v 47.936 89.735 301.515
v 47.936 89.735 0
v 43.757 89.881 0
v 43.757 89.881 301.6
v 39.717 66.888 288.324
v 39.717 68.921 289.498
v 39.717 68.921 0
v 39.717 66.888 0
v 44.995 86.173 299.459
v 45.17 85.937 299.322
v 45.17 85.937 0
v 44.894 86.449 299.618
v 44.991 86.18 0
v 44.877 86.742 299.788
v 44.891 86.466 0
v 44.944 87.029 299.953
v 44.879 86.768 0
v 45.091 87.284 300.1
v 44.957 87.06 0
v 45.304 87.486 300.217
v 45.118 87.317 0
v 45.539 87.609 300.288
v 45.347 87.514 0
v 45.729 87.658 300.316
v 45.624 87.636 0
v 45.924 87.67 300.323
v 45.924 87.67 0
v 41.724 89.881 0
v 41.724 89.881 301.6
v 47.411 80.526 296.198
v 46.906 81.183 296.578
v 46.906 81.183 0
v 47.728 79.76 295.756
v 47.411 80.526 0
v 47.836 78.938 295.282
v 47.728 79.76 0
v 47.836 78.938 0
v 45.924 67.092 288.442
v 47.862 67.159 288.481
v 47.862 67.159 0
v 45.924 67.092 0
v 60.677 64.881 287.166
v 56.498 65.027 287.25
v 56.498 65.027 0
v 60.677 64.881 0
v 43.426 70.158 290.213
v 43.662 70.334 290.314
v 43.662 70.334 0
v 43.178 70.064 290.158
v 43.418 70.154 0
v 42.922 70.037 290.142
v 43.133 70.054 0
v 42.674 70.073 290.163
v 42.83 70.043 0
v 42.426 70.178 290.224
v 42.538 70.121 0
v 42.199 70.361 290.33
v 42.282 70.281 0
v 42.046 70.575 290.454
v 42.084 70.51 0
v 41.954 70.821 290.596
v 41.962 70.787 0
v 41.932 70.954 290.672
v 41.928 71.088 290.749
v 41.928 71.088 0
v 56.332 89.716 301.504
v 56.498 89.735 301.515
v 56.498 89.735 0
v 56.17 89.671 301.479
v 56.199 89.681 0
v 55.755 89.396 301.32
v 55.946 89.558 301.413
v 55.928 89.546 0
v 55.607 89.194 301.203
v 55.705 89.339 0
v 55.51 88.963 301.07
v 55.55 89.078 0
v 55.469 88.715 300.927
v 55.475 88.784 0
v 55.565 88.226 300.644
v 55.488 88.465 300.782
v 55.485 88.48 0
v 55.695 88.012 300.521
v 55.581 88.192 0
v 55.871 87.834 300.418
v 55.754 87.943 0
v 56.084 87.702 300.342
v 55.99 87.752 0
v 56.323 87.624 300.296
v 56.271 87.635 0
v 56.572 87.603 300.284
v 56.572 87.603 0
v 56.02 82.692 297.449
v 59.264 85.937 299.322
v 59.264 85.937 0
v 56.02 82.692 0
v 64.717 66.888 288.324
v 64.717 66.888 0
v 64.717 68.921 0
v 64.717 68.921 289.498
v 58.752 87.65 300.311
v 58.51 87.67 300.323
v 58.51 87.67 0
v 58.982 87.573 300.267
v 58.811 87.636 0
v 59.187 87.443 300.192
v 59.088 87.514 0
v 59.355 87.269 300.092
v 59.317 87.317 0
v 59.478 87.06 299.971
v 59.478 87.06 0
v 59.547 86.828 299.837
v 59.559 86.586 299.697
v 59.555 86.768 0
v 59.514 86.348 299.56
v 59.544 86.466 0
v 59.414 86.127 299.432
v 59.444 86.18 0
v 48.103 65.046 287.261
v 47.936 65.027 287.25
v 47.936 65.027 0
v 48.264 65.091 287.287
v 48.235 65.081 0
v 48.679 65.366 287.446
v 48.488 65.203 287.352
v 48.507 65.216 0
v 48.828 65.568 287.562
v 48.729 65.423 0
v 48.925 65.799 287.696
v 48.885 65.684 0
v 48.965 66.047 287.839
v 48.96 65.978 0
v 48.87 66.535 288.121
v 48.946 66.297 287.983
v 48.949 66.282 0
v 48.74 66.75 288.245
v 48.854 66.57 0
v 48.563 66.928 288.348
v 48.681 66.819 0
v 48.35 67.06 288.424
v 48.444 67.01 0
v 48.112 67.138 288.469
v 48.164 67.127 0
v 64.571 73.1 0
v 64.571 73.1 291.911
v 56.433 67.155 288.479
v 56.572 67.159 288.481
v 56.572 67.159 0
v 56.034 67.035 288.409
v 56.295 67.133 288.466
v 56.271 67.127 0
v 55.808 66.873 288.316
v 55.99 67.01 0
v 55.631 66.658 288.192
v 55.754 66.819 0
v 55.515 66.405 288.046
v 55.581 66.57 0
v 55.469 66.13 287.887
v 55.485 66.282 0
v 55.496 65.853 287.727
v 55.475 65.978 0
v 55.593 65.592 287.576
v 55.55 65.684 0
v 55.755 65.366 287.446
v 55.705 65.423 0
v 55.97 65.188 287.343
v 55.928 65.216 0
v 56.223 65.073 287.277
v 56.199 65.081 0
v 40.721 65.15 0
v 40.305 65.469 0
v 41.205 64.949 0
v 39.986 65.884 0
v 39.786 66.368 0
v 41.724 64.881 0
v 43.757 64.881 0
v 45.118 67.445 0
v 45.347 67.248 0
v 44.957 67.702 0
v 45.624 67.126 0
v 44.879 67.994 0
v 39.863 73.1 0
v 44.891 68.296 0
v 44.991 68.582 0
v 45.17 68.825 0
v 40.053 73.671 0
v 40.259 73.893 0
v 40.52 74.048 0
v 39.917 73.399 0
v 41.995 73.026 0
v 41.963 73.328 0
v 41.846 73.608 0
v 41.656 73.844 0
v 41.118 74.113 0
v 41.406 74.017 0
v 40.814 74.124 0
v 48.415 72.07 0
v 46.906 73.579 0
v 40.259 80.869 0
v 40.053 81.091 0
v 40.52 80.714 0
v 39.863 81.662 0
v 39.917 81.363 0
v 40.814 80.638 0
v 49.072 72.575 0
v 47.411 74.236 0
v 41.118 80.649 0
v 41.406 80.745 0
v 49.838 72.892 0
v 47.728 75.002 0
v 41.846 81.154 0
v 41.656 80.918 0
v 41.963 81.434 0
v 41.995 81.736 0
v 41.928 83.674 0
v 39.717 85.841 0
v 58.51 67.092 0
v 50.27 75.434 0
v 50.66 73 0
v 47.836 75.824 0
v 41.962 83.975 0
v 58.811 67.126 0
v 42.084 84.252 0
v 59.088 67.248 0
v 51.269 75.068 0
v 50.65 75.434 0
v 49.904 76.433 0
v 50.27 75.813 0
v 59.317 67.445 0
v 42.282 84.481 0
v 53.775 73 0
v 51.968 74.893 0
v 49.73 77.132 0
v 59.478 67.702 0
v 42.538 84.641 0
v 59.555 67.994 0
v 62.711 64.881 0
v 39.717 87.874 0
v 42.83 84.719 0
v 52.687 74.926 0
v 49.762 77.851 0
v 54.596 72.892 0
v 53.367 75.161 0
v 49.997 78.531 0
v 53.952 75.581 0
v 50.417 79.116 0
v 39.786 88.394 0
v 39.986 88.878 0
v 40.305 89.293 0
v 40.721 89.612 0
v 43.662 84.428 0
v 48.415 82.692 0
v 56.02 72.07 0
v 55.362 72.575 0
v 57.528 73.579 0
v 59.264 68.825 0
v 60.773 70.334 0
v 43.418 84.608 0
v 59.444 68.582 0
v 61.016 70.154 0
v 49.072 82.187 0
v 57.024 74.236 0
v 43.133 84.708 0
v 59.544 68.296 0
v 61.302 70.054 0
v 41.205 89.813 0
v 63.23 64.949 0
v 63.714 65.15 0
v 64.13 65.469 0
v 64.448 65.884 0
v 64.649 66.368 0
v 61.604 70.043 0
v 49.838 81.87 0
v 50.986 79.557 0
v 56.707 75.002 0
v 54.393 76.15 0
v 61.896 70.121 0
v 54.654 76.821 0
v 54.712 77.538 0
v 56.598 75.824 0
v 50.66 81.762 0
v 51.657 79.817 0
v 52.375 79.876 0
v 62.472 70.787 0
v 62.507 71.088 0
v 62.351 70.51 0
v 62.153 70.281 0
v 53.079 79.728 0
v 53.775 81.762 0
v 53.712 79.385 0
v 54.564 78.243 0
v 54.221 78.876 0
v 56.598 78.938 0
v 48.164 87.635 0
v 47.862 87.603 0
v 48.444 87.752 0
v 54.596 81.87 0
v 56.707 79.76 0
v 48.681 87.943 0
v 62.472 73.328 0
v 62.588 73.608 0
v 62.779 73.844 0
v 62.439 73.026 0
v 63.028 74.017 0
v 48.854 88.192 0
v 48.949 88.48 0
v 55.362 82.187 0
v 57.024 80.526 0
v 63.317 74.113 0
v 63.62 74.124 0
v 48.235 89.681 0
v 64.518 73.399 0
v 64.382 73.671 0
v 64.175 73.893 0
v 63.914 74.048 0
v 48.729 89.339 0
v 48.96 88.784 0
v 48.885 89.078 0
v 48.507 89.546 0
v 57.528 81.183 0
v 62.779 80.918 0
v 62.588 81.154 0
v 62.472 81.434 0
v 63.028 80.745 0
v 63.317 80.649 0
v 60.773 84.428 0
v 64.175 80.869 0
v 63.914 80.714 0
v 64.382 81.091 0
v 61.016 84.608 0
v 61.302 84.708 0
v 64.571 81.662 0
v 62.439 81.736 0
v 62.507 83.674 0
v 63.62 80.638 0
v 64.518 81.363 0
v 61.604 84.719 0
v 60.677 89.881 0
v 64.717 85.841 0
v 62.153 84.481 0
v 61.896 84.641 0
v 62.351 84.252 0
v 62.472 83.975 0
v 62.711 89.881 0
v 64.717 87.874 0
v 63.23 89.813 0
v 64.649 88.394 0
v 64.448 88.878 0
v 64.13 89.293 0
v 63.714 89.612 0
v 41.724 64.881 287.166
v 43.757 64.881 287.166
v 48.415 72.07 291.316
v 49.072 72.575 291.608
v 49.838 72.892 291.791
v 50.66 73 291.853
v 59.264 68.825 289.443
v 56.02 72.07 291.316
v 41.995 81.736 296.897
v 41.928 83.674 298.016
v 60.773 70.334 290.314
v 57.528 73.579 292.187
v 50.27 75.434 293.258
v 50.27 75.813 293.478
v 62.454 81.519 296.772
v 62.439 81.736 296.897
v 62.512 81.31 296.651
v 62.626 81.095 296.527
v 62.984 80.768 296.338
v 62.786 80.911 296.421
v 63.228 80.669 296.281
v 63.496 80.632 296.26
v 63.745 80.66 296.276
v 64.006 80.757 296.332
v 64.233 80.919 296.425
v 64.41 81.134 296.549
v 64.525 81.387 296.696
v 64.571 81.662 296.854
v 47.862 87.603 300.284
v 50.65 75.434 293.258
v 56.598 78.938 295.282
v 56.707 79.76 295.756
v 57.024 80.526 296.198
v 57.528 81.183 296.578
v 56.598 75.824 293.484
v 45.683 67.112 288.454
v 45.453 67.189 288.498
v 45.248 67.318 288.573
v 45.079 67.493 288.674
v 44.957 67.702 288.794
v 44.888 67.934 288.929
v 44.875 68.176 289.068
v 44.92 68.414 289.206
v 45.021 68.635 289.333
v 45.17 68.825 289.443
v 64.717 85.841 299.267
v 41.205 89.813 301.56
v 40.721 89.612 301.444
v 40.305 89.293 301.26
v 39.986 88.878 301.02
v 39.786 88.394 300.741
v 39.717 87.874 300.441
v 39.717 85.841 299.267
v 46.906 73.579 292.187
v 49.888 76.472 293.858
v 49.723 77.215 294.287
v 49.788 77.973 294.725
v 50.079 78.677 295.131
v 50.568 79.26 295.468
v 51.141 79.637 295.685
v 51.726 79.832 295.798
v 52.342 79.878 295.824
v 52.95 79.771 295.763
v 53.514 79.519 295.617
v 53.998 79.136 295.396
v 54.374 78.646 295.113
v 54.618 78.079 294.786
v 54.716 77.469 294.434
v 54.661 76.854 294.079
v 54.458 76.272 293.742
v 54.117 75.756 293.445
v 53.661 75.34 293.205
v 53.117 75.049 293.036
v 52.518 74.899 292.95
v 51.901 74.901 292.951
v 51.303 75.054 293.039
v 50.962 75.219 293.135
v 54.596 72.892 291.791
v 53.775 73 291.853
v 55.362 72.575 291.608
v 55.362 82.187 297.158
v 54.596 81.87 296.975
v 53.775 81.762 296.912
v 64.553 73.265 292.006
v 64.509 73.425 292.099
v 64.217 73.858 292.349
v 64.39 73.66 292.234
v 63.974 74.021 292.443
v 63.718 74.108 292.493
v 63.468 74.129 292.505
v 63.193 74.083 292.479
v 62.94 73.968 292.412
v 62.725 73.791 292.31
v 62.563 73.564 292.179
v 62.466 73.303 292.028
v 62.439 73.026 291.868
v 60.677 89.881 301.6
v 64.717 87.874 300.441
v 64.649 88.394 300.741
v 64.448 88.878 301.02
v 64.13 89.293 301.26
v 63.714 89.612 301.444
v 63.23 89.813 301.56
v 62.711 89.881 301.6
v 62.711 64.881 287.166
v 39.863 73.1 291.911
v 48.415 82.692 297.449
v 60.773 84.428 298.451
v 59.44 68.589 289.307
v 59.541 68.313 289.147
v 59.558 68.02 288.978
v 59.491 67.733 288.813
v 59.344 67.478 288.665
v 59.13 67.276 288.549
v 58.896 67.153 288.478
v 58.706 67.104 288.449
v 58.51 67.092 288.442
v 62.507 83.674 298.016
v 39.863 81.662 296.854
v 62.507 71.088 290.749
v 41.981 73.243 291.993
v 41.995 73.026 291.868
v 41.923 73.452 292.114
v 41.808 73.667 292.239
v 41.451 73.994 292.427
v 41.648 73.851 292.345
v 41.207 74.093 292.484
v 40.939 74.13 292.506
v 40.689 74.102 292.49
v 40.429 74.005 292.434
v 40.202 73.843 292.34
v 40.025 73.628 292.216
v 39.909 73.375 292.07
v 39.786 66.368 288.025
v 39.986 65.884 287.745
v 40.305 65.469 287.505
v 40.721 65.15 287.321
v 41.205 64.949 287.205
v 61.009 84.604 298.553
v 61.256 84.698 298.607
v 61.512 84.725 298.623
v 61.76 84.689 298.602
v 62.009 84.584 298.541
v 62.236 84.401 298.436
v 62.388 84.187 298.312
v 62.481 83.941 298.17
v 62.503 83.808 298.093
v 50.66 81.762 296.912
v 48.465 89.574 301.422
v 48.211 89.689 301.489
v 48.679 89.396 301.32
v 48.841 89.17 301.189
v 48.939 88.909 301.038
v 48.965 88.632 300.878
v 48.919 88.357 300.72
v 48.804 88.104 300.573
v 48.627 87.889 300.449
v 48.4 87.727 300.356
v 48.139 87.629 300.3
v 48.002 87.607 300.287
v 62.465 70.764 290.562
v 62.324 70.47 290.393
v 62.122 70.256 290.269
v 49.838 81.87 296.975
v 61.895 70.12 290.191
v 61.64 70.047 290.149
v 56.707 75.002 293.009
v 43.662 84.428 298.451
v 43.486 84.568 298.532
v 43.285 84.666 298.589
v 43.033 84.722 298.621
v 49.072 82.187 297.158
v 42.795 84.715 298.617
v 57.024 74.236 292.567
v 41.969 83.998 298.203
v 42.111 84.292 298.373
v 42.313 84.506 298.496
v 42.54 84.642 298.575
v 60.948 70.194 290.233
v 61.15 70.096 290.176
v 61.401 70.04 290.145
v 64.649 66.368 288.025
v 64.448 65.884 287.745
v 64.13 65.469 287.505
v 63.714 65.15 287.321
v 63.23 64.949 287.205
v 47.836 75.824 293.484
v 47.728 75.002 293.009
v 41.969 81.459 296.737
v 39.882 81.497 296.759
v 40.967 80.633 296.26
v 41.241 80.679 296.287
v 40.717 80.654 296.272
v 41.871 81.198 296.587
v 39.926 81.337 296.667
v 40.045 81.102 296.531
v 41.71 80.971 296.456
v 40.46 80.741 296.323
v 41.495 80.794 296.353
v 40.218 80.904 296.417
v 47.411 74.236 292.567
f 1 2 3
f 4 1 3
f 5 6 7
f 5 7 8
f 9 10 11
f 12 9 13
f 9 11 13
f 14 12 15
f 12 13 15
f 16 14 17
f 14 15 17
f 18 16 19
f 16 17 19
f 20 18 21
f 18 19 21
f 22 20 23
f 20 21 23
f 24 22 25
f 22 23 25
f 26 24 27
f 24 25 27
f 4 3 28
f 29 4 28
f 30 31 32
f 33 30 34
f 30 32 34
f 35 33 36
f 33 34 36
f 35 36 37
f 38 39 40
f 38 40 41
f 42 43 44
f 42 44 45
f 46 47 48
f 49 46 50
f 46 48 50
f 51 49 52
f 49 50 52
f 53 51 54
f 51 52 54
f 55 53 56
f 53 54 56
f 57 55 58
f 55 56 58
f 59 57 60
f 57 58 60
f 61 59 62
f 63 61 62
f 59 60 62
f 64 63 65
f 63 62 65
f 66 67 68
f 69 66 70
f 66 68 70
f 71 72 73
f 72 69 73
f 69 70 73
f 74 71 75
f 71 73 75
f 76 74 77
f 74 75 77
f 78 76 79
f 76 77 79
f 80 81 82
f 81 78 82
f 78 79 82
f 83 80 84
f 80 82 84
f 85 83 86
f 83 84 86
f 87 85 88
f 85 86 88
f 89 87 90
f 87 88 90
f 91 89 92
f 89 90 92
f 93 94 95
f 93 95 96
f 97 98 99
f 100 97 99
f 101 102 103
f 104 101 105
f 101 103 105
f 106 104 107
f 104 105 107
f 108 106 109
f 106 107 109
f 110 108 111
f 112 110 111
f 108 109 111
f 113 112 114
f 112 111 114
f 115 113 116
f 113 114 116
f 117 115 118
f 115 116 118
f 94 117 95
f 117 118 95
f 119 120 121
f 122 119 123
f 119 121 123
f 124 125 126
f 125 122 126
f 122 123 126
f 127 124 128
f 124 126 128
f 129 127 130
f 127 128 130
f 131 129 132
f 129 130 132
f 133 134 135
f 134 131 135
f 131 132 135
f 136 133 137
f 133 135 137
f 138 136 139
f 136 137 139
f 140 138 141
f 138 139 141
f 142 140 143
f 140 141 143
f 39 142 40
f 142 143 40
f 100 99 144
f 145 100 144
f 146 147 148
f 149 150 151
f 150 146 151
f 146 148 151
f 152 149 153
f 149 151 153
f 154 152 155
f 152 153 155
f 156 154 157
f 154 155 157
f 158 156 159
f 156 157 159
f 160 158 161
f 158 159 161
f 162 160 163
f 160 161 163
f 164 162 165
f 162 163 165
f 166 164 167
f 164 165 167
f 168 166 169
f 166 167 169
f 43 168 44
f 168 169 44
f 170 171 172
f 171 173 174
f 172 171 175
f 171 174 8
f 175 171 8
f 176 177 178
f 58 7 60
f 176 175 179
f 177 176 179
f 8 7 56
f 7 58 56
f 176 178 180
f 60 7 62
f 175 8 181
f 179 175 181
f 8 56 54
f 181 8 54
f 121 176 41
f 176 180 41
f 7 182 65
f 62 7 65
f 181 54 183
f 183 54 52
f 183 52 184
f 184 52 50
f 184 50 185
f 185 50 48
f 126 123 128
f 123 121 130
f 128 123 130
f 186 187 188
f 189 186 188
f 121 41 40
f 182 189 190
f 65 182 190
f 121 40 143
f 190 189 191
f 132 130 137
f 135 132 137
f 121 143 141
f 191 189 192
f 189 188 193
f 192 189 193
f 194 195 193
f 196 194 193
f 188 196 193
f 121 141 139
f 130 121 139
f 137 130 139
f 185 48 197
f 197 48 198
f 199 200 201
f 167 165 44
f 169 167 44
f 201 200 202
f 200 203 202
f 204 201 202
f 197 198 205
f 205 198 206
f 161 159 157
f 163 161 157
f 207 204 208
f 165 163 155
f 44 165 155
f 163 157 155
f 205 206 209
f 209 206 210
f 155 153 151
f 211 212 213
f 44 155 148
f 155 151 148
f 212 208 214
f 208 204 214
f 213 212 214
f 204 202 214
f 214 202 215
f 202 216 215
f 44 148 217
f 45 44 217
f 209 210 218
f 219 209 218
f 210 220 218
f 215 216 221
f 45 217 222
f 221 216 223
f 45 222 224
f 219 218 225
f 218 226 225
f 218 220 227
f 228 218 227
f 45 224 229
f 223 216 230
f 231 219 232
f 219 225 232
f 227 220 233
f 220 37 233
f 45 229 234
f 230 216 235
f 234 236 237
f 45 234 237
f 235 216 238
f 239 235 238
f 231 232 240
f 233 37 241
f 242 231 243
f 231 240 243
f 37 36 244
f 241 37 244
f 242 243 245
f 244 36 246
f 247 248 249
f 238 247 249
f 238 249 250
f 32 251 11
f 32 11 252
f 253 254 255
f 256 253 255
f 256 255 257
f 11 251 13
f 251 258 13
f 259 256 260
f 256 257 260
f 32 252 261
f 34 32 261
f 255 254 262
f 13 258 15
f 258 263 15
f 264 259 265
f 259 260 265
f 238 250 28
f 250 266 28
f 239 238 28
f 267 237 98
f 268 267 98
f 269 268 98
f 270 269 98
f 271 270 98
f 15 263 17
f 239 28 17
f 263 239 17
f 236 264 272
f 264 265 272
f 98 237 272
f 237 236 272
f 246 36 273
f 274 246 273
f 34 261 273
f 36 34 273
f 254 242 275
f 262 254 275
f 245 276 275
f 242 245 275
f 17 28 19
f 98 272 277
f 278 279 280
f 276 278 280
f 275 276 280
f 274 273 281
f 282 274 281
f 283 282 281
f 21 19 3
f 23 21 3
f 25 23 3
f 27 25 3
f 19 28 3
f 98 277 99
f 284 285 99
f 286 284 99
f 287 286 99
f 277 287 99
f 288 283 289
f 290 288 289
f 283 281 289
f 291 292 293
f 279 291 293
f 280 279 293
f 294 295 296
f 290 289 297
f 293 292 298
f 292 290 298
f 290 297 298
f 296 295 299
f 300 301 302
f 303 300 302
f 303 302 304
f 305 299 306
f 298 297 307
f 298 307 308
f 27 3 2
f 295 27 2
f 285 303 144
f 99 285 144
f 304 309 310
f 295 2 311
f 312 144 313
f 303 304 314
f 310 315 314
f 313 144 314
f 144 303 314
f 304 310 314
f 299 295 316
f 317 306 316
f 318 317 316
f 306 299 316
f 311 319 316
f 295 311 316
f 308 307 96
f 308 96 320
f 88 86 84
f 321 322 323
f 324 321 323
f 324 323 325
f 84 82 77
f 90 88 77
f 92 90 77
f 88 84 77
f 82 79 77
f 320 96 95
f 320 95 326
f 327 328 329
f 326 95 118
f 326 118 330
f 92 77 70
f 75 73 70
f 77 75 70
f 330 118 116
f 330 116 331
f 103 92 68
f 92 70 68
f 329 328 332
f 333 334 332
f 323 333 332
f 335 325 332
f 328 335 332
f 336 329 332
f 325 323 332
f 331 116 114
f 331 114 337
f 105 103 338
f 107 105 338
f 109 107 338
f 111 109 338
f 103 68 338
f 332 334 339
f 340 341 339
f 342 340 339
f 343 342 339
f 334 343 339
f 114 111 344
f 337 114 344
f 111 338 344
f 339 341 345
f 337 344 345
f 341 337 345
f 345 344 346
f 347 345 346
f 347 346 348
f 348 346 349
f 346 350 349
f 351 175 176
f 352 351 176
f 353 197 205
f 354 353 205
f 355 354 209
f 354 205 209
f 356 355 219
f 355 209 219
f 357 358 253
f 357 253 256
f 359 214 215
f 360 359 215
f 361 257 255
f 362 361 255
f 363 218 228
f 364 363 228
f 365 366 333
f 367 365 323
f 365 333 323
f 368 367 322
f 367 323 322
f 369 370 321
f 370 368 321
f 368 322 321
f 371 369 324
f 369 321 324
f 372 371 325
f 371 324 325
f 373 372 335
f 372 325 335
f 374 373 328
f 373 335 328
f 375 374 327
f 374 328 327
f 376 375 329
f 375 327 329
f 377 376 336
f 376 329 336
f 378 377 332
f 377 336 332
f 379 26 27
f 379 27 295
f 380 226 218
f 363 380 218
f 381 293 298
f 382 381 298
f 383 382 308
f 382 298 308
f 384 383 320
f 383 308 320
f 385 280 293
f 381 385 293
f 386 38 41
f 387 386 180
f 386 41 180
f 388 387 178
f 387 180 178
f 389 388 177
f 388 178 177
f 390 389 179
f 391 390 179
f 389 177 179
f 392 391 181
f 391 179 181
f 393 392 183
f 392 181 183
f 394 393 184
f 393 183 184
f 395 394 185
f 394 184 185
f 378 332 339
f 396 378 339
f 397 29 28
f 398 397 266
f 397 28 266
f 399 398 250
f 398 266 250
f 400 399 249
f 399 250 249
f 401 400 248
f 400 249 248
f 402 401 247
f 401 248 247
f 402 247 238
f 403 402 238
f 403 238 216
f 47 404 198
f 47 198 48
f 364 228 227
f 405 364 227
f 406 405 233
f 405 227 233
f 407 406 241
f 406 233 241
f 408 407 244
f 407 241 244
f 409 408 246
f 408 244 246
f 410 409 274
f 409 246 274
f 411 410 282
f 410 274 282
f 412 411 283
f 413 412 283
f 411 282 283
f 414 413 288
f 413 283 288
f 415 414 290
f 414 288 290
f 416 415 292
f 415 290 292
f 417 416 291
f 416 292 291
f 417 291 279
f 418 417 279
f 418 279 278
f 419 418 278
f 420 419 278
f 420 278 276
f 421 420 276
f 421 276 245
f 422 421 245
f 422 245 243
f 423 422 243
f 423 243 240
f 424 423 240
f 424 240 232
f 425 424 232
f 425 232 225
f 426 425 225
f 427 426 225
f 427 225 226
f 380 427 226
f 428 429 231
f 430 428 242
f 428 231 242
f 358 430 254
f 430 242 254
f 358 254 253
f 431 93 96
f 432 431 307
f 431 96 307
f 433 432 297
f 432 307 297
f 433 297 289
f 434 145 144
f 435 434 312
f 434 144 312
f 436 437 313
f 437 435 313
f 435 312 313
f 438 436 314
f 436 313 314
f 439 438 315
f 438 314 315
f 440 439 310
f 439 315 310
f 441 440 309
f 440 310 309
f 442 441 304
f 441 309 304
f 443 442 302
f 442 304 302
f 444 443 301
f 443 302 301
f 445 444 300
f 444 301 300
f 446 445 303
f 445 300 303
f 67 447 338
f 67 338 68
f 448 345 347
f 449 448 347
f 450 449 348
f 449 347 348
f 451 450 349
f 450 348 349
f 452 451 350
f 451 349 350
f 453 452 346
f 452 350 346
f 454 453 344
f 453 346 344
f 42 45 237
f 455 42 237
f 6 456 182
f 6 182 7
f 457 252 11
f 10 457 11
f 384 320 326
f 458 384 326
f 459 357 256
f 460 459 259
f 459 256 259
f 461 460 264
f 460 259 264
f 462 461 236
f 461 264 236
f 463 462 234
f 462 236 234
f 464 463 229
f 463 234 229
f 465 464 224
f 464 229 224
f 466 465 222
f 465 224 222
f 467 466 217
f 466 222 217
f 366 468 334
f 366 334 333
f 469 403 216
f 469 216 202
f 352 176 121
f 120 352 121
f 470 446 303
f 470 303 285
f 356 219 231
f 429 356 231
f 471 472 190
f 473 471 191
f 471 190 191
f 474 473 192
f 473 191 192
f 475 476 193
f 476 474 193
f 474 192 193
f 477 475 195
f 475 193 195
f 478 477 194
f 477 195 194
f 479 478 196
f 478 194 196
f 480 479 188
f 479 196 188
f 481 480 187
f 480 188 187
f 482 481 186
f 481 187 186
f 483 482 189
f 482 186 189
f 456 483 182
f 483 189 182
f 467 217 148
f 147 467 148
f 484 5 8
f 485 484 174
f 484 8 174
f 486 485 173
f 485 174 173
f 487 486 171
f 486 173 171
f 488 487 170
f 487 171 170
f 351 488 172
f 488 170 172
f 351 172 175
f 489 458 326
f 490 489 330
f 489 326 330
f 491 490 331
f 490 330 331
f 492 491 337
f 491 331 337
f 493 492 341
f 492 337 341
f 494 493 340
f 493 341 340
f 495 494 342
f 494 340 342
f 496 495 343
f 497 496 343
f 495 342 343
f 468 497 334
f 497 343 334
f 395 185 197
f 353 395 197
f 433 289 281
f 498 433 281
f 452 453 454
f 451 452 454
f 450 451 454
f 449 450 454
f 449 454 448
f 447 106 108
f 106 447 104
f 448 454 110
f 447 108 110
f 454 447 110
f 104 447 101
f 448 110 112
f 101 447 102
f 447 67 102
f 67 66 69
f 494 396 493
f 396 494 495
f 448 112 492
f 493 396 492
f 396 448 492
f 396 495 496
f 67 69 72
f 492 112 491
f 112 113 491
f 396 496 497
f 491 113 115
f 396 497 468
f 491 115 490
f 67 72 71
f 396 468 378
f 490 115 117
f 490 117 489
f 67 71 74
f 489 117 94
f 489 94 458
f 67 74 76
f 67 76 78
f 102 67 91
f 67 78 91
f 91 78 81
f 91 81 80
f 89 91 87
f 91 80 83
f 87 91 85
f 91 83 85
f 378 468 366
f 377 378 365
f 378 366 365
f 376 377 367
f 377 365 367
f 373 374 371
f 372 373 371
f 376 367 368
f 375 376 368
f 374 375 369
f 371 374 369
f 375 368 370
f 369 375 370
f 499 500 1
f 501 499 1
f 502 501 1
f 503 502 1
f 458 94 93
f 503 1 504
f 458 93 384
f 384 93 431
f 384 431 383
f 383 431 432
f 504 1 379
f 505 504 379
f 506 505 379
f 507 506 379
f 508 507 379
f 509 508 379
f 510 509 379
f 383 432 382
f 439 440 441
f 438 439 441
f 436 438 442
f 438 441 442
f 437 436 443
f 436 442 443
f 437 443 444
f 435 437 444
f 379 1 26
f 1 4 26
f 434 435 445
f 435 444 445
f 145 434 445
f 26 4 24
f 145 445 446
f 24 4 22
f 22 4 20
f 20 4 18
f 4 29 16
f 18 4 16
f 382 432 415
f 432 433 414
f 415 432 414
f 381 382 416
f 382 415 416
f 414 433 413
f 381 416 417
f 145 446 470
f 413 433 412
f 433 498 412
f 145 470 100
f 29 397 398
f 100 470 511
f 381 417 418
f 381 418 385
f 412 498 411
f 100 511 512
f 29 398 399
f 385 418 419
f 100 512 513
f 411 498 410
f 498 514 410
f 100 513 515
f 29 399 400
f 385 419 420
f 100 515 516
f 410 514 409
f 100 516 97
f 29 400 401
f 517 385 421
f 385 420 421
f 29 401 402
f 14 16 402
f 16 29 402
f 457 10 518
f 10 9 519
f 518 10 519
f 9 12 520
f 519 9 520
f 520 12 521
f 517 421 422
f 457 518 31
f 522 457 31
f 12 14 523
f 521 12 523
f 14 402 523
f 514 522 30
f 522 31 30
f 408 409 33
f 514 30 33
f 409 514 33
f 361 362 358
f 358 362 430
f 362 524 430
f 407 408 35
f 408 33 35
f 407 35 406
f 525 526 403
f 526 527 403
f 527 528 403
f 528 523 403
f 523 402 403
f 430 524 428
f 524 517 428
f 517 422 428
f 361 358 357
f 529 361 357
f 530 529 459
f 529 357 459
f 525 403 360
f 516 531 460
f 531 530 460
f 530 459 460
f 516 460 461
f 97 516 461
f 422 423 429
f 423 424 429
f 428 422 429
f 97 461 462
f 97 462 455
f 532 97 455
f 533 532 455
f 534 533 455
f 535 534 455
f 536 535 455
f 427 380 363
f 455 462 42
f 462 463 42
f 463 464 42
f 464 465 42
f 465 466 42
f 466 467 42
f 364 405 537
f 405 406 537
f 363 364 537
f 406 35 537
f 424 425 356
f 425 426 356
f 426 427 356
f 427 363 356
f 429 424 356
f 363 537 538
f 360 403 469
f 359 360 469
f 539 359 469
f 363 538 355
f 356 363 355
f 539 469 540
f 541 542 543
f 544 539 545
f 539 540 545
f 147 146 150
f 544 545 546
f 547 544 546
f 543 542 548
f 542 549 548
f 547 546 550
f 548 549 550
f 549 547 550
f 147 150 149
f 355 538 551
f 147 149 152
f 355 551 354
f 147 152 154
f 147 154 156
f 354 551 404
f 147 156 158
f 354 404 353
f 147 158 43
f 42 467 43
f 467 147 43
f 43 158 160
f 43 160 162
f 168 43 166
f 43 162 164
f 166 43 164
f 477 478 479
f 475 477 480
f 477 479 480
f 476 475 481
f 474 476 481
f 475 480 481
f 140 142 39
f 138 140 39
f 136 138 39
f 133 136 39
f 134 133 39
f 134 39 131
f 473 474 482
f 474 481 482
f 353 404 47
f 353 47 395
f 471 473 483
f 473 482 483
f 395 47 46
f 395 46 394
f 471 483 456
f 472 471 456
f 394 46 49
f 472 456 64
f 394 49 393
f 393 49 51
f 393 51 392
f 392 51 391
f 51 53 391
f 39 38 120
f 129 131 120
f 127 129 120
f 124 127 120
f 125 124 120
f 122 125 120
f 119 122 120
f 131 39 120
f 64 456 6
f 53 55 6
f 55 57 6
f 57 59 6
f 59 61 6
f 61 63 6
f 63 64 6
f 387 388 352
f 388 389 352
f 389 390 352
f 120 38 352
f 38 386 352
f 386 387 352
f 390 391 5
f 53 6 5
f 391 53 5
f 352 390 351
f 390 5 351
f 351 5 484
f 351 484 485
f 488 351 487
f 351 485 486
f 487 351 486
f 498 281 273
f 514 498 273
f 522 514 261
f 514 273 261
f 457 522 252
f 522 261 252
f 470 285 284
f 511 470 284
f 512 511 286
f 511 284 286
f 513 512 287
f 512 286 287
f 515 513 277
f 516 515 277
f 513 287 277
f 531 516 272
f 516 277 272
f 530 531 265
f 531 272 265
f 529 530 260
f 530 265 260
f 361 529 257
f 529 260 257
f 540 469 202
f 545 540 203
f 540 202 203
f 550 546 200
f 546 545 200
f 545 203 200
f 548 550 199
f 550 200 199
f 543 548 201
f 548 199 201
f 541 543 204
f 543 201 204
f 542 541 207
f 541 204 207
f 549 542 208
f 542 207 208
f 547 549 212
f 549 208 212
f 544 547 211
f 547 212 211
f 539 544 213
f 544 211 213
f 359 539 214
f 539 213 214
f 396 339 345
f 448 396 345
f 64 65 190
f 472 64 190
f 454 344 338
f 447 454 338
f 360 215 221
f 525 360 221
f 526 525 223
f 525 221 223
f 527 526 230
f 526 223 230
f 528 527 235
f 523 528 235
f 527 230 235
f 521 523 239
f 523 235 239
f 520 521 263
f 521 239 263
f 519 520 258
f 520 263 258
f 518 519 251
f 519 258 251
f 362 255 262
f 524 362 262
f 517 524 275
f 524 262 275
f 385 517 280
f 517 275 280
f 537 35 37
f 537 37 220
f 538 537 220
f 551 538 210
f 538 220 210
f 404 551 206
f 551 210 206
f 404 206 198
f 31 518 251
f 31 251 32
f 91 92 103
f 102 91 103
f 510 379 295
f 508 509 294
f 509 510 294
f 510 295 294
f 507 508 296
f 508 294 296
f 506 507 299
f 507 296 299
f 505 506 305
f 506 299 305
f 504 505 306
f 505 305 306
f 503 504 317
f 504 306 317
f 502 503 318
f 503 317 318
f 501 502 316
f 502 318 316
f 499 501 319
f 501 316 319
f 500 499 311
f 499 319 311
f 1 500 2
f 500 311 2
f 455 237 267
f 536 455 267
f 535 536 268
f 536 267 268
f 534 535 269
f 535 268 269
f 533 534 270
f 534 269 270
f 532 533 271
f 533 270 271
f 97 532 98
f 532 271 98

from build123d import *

# Parameters (mm, degrees)
BOSS_EXTRUDE1_DEPTH = 301.5996
CUT_EXTRUDE1_DEPTH  = 322.293063297


with BuildPart() as part:
    # Model → Boss-Extrude1 (new body)
    with BuildSketch(Plane.XY):
        with BuildLine():
            Line((50.659960212, 72.999871414), (53.774553856, 72.999871414))
            ThreePointArc((53.774553856, 72.999871414), (54.989573754, 72.758188929), (56.019617887, 72.069935444))
            Line((56.019617887, 72.069935444), (59.264200891, 68.825352439))
            ThreePointArc((59.264200891, 68.825352439), (59.477513437, 67.701802895), (58.510322513, 67.091550869))
            Line((58.510322513, 67.091550869), (56.572487817, 67.159221548))
            ThreePointArc((56.572487817, 67.159221548), (55.4691069, 66.130302197), (56.498026251, 65.026921279))
            Line((56.498026251, 65.026921279), (60.677257034, 64.880979325))
            Line((60.677257034, 64.880979325), (62.710657034, 64.880979325))
            ThreePointArc((62.710657034, 64.880979325), (64.129537501, 65.468698857), (64.717257034, 66.887579325))
            Line((64.717257034, 66.887579325), (64.717257034, 68.920979325))
            Line((64.717257034, 68.920979325), (64.57131508, 73.100210108))
            ThreePointArc((64.57131508, 73.100210108), (63.467934162, 74.129129459), (62.439014811, 73.025748542))
            Line((62.439014811, 73.025748542), (62.50668549, 71.087913846))
            ThreePointArc((62.50668549, 71.087913846), (61.896433464, 70.120722922), (60.77288392, 70.334035468))
            Line((60.77288392, 70.334035468), (57.528300915, 73.578618472))
            ThreePointArc((57.528300915, 73.578618472), (56.84004743, 74.608662605), (56.598364945, 75.823682503))
            Line((56.598364945, 75.823682503), (56.598364945, 78.938276147))
            ThreePointArc((56.598364945, 78.938276147), (56.84004743, 80.153296044), (57.528300915, 81.183340177))
            Line((57.528300915, 81.183340177), (60.77288392, 84.427923182))
            ThreePointArc((60.77288392, 84.427923182), (61.896433464, 84.641235728), (62.50668549, 83.674044803))
            Line((62.50668549, 83.674044803), (62.439014811, 81.736210108))
            ThreePointArc((62.439014811, 81.736210108), (63.467934162, 80.63282919), (64.57131508, 81.661748542))
            Line((64.57131508, 81.661748542), (64.717257034, 85.840979325))
            Line((64.717257034, 85.840979325), (64.717257034, 87.874379325))
            ThreePointArc((64.717257034, 87.874379325), (64.129537501, 89.293259792), (62.710657034, 89.880979325))
            Line((62.710657034, 89.880979325), (60.677257034, 89.880979325))
            Line((60.677257034, 89.880979325), (56.498026251, 89.73503737))
            ThreePointArc((56.498026251, 89.73503737), (55.4691069, 88.631656452), (56.572487817, 87.602737101))
            Line((56.572487817, 87.602737101), (58.510322513, 87.67040778))
            ThreePointArc((58.510322513, 87.67040778), (59.477513437, 87.060155754), (59.264200891, 85.93660621))
            Line((59.264200891, 85.93660621), (56.019617887, 82.692023205))
            ThreePointArc((56.019617887, 82.692023205), (54.989573754, 82.00376972), (53.774553856, 81.762087236))
            Line((53.774553856, 81.762087236), (50.659960212, 81.762087236))
            ThreePointArc((50.659960212, 81.762087236), (49.444940315, 82.00376972), (48.414896182, 82.692023205))
            Line((48.414896182, 82.692023205), (45.170313177, 85.93660621))
            ThreePointArc((45.170313177, 85.93660621), (44.957000631, 87.060155754), (45.924191556, 87.67040778))
            Line((45.924191556, 87.67040778), (47.862026251, 87.602737101))
            ThreePointArc((47.862026251, 87.602737101), (48.965407169, 88.631656452), (47.936487817, 89.73503737))
            Line((47.936487817, 89.73503737), (43.757257034, 89.880979325))
            Line((43.757257034, 89.880979325), (41.723857034, 89.880979325))
            ThreePointArc((41.723857034, 89.880979325), (40.304976567, 89.293259792), (39.717257034, 87.874379325))
            Line((39.717257034, 87.874379325), (39.717257034, 85.840979325))
            Line((39.717257034, 85.840979325), (39.863198989, 81.661748542))
            ThreePointArc((39.863198989, 81.661748542), (40.966579907, 80.63282919), (41.995499258, 81.736210108))
            Line((41.995499258, 81.736210108), (41.927828579, 83.674044803))
            ThreePointArc((41.927828579, 83.674044803), (42.538080605, 84.641235728), (43.661630149, 84.427923182))
            Line((43.661630149, 84.427923182), (46.906213154, 81.183340177))
            ThreePointArc((46.906213154, 81.183340177), (47.594466639, 80.153296044), (47.836149123, 78.938276147))
            Line((47.836149123, 78.938276147), (47.836149123, 75.823682503))
            ThreePointArc((47.836149123, 75.823682503), (47.594466639, 74.608662605), (46.906213154, 73.578618472))
            Line((46.906213154, 73.578618472), (43.661630149, 70.334035468))
            ThreePointArc((43.661630149, 70.334035468), (42.538080605, 70.120722922), (41.927828579, 71.087913846))
            Line((41.927828579, 71.087913846), (41.995499258, 73.025748542))
            ThreePointArc((41.995499258, 73.025748542), (40.966579907, 74.129129459), (39.863198989, 73.100210108))
            Line((39.863198989, 73.100210108), (39.717257034, 68.920979325))
            Line((39.717257034, 68.920979325), (39.717257034, 66.887579325))
            ThreePointArc((39.717257034, 66.887579325), (40.304976567, 65.468698857), (41.723857034, 64.880979325))
            Line((41.723857034, 64.880979325), (43.757257034, 64.880979325))
            Line((43.757257034, 64.880979325), (47.936487817, 65.026921279))
            ThreePointArc((47.936487817, 65.026921279), (48.965407169, 66.130302197), (47.862026251, 67.159221548))
            Line((47.862026251, 67.159221548), (45.924191556, 67.091550869))
            ThreePointArc((45.924191556, 67.091550869), (44.957000631, 67.701802895), (45.170313177, 68.825352439))
            Line((45.170313177, 68.825352439), (48.414896182, 72.069935444))
            ThreePointArc((48.414896182, 72.069935444), (49.444940315, 72.758188929), (50.659960212, 72.999871414))
        make_face()
        with BuildLine():
            Line((50.64953831, 75.433607249), (50.269884959, 75.433607249))
            Line((50.269884959, 75.433607249), (50.269884959, 75.8132606))
            ThreePointArc((50.269884959, 75.8132606), (53.985023987, 79.148746278), (50.64953831, 75.433607249))
        make_face(mode=Mode.SUBTRACT)
    extrude(amount=BOSS_EXTRUDE1_DEPTH)

    # Sketch2 → Cut-Extrude1 (cut, through all)
    with BuildSketch(Plane(origin=(0, 0, 0), x_dir=(0, 0, -1), z_dir=(1, 0, 0))):
        Polygon((-301.5996, 64.880979325), (-301.5996, 89.880979325), (-287.16584327, 64.880979325), align=None)
    extrude(amount=CUT_EXTRUDE1_DEPTH, mode=Mode.SUBTRACT)


solid = part.part
